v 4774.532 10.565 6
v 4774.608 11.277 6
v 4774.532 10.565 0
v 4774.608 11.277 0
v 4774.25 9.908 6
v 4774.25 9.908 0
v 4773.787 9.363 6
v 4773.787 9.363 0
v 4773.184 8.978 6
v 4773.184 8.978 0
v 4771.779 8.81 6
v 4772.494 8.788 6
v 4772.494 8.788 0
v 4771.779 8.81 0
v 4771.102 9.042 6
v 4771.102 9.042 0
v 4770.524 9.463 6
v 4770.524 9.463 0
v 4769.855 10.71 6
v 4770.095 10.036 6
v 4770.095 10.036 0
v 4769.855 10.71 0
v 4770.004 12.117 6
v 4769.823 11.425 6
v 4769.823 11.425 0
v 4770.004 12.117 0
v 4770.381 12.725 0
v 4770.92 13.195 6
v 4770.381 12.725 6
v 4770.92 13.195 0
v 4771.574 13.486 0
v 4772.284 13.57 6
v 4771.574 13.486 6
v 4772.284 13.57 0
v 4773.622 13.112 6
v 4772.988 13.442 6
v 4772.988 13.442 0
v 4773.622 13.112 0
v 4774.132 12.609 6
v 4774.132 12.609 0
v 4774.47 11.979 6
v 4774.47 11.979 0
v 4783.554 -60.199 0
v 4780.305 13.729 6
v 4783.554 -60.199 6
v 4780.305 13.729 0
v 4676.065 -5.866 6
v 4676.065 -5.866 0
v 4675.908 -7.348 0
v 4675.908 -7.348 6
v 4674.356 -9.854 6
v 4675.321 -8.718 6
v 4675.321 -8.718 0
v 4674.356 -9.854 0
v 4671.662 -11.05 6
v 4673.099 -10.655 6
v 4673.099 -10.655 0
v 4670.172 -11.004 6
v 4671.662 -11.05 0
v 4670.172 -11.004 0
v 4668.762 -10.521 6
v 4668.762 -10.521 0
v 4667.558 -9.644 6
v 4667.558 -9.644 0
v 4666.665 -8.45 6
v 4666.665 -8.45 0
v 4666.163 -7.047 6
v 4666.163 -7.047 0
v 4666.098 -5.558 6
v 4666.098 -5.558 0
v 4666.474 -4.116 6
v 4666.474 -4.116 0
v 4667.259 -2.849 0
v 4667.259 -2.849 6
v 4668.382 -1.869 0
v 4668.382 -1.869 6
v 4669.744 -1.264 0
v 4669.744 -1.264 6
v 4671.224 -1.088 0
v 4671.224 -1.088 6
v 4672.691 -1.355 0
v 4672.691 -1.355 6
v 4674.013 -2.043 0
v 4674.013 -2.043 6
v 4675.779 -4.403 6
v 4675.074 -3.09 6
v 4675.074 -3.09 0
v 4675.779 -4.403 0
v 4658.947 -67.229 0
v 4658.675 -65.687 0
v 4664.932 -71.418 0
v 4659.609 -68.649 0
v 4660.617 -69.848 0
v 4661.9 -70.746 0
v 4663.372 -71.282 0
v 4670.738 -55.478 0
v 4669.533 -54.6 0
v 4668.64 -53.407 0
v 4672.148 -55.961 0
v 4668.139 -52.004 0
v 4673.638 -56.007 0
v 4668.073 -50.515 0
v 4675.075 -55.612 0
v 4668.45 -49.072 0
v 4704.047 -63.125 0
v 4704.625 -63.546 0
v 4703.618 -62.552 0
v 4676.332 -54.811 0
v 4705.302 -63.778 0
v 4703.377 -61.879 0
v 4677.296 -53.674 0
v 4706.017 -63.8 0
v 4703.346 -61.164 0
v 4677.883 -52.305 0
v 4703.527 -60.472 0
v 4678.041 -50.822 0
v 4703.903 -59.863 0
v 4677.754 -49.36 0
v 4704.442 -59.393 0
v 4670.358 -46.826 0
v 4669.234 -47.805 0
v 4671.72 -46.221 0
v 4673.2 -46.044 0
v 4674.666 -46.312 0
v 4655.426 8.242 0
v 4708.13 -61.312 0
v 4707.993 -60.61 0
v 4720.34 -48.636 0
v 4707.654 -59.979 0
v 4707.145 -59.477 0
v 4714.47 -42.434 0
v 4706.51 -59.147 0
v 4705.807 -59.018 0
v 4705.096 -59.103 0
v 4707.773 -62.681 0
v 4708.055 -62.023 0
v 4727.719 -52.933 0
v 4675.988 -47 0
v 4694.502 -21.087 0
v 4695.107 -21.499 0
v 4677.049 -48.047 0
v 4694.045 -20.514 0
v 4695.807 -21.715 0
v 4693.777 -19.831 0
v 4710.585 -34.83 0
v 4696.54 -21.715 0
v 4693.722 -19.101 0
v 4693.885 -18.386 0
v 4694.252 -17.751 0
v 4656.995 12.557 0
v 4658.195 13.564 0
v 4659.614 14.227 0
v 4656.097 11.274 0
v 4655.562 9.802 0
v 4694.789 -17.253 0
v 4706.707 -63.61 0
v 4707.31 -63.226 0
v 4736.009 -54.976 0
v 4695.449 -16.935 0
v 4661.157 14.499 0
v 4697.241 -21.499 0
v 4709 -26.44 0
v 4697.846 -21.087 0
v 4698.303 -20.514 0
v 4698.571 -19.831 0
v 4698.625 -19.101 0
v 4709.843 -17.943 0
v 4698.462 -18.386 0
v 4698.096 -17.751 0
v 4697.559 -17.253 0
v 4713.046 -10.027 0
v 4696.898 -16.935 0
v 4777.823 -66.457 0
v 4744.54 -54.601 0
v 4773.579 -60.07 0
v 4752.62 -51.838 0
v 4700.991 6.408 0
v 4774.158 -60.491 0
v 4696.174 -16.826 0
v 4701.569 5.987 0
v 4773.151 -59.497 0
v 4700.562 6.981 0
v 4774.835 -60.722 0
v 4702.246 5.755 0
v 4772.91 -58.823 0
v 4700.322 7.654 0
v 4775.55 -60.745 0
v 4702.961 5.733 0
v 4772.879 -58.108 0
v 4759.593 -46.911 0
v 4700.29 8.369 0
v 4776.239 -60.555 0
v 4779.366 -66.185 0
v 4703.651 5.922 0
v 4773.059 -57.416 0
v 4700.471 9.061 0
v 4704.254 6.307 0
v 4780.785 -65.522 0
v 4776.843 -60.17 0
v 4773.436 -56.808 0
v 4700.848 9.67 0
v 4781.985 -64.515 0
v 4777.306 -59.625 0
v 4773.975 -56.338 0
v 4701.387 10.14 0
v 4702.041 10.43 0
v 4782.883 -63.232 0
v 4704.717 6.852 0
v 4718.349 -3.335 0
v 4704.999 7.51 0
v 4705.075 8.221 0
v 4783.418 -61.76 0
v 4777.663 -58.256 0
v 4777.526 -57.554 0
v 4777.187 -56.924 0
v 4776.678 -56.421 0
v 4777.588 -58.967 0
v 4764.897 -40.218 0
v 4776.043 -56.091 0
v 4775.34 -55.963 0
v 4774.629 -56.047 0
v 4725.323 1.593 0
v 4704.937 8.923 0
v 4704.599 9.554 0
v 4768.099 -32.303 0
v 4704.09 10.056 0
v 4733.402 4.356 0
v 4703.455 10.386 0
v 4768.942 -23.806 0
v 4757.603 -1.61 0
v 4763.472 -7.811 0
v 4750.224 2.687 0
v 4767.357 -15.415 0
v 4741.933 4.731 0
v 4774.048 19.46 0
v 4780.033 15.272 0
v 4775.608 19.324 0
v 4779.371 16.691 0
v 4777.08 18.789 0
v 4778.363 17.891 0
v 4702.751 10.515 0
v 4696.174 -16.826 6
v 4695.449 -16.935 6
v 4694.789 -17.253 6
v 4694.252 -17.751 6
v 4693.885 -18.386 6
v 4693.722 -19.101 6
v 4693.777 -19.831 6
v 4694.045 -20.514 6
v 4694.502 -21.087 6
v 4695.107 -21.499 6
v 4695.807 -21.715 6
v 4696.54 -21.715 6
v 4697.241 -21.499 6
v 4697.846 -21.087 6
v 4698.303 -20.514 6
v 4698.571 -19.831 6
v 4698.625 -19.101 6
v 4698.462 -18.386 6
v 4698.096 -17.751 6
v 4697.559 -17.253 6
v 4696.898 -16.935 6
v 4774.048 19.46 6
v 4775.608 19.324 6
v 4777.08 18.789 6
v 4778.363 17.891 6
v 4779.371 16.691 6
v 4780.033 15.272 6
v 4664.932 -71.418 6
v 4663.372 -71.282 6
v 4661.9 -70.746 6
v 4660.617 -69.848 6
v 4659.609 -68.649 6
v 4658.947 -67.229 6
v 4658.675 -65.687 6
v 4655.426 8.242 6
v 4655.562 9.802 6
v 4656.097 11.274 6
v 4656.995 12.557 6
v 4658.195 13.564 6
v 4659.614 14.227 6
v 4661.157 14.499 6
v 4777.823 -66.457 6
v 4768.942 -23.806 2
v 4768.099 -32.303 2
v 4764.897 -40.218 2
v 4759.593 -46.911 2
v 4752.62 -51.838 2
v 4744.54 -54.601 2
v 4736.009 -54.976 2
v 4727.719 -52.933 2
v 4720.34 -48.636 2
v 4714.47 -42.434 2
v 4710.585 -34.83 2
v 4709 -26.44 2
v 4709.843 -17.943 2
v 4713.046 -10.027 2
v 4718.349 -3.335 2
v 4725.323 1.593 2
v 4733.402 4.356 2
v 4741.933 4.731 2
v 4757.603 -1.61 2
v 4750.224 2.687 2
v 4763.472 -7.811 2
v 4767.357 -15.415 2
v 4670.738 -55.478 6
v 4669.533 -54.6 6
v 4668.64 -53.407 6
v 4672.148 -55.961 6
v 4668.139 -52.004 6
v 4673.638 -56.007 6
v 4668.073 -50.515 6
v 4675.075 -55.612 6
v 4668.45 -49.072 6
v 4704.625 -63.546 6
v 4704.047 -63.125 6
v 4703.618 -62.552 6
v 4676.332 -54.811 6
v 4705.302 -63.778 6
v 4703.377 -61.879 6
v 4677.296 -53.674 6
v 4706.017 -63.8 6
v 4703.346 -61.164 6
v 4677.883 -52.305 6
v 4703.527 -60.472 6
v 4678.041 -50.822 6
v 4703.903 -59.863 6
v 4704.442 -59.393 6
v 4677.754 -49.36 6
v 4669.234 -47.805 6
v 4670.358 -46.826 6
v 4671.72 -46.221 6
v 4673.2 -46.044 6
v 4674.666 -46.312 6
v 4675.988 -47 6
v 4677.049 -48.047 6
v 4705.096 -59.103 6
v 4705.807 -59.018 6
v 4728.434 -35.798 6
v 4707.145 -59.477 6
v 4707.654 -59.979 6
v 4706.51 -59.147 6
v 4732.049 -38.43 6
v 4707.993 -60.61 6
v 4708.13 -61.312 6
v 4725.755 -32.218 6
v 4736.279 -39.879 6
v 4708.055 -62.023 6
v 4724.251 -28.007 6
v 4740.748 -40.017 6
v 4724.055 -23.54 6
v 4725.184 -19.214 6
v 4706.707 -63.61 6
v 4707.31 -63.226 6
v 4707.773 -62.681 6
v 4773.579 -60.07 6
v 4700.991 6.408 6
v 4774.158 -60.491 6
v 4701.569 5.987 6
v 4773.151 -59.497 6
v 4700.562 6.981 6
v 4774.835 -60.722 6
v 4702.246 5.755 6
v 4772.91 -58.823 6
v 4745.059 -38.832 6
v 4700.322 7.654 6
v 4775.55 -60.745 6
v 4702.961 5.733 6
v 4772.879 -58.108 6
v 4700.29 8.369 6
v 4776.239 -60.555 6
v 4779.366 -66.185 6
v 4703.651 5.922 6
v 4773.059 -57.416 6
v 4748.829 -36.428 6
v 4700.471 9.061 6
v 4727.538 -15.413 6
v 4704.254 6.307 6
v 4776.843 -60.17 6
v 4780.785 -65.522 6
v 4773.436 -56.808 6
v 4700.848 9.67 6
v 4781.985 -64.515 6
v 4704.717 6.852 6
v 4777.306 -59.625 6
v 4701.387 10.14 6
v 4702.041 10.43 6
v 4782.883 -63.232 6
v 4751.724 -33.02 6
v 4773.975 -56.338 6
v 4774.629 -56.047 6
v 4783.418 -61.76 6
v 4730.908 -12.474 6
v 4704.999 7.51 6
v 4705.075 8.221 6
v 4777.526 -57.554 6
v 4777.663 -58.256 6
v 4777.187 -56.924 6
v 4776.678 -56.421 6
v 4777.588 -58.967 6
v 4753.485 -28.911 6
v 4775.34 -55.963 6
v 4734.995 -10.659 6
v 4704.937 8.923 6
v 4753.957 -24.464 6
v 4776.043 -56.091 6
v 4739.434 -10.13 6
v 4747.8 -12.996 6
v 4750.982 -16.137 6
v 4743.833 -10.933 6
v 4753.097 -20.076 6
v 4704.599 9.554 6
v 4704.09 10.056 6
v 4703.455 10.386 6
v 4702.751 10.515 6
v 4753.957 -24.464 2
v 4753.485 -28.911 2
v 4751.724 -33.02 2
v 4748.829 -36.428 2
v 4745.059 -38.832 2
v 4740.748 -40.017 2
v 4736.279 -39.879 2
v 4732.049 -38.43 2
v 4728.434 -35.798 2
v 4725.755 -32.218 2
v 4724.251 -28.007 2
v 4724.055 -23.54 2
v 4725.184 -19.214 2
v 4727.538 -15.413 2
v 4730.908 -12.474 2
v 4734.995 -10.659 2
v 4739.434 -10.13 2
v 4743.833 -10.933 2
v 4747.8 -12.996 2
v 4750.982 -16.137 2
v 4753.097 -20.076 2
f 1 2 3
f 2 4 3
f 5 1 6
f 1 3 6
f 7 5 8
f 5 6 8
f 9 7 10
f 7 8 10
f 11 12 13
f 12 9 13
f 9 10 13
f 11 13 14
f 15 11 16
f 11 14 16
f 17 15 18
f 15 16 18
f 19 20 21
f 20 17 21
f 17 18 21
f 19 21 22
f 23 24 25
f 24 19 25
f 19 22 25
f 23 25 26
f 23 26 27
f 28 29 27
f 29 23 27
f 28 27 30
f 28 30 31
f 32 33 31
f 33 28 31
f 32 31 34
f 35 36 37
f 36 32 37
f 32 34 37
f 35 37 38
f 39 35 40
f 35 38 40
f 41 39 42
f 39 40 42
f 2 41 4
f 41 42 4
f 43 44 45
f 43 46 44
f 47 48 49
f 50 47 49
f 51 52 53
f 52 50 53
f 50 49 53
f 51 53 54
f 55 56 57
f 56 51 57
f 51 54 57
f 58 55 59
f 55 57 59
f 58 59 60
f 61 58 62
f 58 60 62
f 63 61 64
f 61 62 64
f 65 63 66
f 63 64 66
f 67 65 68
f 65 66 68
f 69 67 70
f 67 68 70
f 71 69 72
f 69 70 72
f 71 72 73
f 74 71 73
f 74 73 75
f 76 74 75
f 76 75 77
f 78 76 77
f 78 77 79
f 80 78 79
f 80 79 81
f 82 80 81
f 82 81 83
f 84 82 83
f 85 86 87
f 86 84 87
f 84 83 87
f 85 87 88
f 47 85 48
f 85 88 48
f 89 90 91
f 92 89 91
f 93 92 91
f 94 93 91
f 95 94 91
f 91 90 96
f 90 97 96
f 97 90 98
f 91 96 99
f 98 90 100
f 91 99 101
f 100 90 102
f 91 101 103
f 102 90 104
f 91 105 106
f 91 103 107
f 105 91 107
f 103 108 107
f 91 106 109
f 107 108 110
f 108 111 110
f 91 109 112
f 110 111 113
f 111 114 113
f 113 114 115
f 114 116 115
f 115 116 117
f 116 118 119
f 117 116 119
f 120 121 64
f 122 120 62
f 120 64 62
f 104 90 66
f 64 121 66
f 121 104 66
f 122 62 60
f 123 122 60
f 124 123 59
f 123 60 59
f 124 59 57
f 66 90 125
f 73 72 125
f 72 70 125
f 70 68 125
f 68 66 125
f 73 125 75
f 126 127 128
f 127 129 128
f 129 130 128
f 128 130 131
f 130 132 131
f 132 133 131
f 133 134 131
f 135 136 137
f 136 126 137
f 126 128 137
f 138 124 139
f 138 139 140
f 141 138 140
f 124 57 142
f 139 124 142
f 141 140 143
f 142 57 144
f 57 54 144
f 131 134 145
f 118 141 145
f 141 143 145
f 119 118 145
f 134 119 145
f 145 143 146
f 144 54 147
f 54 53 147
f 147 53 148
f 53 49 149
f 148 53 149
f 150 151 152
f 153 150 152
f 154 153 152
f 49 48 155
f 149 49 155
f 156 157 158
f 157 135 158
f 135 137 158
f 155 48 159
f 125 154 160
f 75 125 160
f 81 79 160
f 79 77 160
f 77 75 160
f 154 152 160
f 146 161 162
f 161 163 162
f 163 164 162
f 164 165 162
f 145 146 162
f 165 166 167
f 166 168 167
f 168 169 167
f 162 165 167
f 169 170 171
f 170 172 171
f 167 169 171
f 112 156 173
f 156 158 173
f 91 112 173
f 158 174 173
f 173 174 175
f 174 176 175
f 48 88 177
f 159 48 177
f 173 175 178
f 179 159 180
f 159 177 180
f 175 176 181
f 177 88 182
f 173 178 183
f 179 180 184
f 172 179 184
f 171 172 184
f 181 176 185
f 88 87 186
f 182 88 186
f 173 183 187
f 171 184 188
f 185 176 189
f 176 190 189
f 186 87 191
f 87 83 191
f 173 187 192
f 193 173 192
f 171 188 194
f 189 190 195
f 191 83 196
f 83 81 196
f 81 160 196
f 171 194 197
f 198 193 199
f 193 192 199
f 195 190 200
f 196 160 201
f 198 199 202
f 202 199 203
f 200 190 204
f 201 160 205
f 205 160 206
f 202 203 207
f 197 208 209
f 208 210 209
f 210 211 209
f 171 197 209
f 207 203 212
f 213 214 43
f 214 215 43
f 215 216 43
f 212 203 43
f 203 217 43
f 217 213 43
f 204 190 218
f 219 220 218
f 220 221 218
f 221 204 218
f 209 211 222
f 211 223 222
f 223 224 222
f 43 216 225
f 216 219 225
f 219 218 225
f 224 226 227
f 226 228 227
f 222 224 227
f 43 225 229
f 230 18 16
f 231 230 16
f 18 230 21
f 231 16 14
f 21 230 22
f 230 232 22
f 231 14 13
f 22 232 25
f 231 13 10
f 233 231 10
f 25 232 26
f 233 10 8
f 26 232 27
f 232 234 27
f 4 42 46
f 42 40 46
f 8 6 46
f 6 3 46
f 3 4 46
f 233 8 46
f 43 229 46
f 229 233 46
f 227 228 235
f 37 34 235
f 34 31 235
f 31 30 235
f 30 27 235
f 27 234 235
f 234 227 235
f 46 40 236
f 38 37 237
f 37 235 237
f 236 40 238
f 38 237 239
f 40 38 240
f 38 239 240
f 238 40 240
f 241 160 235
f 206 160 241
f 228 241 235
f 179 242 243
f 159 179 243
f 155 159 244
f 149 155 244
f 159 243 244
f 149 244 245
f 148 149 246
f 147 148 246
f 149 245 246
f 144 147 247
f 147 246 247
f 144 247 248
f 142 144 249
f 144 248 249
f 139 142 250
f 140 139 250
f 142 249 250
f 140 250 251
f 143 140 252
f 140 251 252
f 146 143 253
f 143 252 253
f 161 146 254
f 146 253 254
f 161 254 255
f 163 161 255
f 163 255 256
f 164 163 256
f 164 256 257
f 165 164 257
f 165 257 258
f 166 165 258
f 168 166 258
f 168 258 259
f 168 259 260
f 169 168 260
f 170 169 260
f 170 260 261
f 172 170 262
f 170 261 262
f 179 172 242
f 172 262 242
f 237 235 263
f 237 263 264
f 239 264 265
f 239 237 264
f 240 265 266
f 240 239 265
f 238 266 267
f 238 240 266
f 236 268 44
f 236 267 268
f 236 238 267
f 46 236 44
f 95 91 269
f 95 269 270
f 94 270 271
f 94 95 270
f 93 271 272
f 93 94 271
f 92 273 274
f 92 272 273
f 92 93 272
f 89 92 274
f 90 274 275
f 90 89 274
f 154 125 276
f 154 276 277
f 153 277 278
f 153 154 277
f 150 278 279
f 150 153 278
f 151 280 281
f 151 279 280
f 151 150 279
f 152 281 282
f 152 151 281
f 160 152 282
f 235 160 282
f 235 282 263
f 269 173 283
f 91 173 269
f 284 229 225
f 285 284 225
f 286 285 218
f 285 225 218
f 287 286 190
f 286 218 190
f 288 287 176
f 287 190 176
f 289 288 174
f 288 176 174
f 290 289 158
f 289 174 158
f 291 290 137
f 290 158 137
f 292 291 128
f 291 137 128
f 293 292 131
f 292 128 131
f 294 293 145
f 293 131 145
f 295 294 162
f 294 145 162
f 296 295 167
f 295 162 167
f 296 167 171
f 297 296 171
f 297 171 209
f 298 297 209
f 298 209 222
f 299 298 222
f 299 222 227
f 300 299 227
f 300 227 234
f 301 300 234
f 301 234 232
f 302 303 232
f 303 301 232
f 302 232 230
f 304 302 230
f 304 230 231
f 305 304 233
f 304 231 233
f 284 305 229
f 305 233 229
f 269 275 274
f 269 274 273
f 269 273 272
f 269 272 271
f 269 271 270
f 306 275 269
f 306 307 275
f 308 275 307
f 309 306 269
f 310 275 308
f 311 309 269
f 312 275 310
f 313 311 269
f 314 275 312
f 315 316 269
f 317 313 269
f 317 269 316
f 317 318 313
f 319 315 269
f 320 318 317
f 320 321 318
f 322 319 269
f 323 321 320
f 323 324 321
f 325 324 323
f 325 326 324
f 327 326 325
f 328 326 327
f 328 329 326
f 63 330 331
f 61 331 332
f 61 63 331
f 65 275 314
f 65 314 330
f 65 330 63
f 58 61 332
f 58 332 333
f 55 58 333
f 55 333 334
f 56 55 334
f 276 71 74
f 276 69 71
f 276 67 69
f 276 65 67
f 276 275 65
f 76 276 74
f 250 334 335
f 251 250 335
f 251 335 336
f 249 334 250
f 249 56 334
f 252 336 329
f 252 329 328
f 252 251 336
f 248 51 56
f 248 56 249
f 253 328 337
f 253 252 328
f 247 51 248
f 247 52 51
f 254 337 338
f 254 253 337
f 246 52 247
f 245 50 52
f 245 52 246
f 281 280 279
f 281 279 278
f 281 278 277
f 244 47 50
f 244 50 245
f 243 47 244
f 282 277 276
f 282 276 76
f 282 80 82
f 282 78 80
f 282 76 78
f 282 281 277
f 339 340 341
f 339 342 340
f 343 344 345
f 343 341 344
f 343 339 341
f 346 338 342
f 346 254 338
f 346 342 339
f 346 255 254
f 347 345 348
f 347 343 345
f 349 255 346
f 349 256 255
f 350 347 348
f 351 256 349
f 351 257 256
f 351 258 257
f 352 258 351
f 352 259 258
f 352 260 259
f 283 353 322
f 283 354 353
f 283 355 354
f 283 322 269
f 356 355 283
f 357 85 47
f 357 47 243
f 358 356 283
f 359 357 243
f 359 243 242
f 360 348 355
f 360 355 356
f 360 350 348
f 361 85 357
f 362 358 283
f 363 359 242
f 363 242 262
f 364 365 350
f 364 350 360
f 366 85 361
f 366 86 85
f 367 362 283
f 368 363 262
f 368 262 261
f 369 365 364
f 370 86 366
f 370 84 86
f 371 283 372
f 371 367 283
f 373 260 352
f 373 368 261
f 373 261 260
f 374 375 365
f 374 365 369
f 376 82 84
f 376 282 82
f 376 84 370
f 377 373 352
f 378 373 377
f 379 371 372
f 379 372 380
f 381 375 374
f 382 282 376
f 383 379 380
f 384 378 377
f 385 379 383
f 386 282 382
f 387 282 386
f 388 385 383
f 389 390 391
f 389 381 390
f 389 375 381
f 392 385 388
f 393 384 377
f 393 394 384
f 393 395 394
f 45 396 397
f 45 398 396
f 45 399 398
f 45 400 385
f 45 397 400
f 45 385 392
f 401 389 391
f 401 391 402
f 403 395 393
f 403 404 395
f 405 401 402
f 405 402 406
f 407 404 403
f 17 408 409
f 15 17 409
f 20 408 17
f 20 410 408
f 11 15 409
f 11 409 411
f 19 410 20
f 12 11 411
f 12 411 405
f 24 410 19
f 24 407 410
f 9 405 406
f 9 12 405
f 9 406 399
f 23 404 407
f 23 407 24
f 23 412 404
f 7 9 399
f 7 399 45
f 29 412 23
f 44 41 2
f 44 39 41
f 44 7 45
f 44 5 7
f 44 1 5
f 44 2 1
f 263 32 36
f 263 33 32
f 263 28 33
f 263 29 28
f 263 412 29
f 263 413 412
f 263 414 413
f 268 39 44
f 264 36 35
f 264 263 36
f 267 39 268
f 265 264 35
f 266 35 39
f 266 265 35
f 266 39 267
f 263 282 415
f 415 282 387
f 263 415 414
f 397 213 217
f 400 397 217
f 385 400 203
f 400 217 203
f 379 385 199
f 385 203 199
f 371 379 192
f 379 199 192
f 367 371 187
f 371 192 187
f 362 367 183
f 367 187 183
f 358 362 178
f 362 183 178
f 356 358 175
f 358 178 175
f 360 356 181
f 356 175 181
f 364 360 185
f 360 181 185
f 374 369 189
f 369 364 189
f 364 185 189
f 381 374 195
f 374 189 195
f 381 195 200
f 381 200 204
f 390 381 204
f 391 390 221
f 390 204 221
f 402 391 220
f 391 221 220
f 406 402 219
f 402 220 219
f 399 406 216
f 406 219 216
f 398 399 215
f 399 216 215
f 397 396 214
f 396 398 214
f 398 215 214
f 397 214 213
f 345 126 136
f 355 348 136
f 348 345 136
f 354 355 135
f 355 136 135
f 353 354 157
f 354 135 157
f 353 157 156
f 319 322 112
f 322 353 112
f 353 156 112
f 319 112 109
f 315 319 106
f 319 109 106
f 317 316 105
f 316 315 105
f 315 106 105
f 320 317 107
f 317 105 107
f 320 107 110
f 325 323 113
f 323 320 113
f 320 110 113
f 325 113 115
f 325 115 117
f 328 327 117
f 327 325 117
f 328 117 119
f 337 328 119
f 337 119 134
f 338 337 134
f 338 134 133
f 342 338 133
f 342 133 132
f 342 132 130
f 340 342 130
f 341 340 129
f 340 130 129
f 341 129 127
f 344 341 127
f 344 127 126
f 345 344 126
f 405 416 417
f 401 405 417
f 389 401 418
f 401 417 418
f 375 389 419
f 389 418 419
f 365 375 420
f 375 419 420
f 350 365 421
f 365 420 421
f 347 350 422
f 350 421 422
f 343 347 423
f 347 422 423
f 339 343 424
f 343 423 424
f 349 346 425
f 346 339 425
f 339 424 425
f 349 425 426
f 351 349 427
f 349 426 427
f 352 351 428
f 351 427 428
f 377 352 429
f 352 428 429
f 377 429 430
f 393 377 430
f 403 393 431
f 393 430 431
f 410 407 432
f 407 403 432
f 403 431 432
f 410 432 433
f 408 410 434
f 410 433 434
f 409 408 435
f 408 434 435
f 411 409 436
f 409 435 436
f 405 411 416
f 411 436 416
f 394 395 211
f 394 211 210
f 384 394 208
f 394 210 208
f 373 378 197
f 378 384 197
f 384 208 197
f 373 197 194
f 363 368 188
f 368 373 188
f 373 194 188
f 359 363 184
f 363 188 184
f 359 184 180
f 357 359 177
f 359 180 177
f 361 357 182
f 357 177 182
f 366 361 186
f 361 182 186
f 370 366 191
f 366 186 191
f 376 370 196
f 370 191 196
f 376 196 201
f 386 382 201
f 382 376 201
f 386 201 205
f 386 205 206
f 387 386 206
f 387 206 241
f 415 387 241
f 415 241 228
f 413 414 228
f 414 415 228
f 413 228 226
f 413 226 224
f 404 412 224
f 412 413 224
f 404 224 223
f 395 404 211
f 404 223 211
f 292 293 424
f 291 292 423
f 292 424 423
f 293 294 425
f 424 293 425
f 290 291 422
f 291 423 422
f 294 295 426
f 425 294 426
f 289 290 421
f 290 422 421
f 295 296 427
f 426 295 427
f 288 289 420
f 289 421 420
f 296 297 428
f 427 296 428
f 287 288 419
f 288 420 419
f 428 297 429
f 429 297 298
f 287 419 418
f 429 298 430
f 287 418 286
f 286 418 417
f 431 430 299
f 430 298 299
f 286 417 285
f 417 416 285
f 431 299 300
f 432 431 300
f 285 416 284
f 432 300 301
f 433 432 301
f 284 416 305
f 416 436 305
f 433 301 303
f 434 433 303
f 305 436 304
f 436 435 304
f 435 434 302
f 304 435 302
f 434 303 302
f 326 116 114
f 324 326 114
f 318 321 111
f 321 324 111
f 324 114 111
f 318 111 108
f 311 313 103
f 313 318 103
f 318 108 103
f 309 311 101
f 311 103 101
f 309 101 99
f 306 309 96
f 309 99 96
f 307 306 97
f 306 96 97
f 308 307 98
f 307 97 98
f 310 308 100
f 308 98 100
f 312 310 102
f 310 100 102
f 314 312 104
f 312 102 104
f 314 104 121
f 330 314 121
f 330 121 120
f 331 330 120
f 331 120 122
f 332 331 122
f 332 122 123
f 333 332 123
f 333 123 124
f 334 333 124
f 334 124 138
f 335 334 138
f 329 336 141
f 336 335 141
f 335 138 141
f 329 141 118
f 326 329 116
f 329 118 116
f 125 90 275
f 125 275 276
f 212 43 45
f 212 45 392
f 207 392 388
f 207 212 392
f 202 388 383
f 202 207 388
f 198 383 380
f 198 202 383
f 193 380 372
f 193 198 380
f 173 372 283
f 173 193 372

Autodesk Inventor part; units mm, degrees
ref_plane "YZ Plane" through (0, 0, 0) normal (1, 0, 0) x (0, 1, 0)
ref_plane "XZ Plane" through (0, 0, 0) normal (0, 1, 0) x (-1, 0, 0)
ref_plane "XY Plane" through (0, 0, 0) normal (0, 0, 1) x (1, 0, 0)
ref_plane "Płaszczyzna konstrukcyjna1" through (4586.1519, -9.817, 0) normal (0, 0, 1) x (0.999, 0.0439, 0)
sketch "Szkic1" plane through (4586.1519, -9.817, 0) normal (0, 0, 1) x (0.999, 0.0439, 0)
  circle A0 centre (85, 0) radius 5
  circle A1 centre (85, -45) radius 5
  line L0 (76, 21) -> (189, 21)
  line L1 (195, 15) -> (195, -59)
  line L2 (189, -65) -> (76, -65)
  line L3 (70, -59) -> (70, 15)
  arc A2 (70, -59) -> (76, -65) centre (76, -59) ccw
  arc A3 (76, 21) -> (70, 15) centre (76, 15) ccw
  arc A4 (189, -65) -> (195, -59) centre (189, -59) ccw
  arc A5 (195, 15) -> (189, 21) centre (189, 15) ccw
  circle A6 centre (152, -22) radius 30
  circle A7 centre (152, -22) radius 15
  line L4 (117.2, 12.8) -> (186.8, -56.8) construction
  line L5 (186.8, 12.8) -> (117.2, -56.8) construction
  circle A8 centre (117.2, 12.8) radius 2.4
  circle A9 centre (117.2, -56.8) radius 2.4
  circle A10 centre (186.8, -56.8) radius 2.4
  circle A11 centre (186.8, 12.8) radius 2.4
  point P0 (-4581.2965, 211.2059)
  point P1 (195, -65)
  point P2 (195, 21)
  point P3 (70, -65)
  dimension "d0" = 10
  dimension "d1" = 10
  dimension "d2" = 125
  dimension "d3" = 86
  dimension "d4" = 6
  dimension "d7" = 45
  dimension "d8" = 60
  dimension "d9" = 30
  dimension "d10" = 69.6
  dimension "d11" = 69.6
  dimension "d12" = 4.8
  dimension "d13" = 4.8
  dimension "d14" = 4.8
  dimension "d15" = 4.8
extrude "Wyciągnięcie proste1" add sketch "Szkic1" along normal blind 6 contours L0 A5 L1 A4 L2 A2 L3 A3 | A6
extrude "Wyciągnięcie proste2" cut sketch "Szkic1" along normal blind 2 contours A6
thread "Gwint1" size "M6x1" class "6H" standard "ANSI Metric M Profile" full length
thread "Gwint2" size "M6x1" class "6H" standard "ANSI Metric M Profile" full length
thread "Gwint3" size "M6x1" class "6H" standard "ANSI Metric M Profile" full length
thread "Gwint4" size "M6x1" class "6H" standard "ANSI Metric M Profile" full length
sketch "Szkic3" plane through (4586.1519, -9.817, 0) normal (0, 0, -1) x (-0.999, -0.0439, 0)
  point P0 (-109.5, -14.2897)
hole "Otwór2" at (4696.1738, -19.2843, 0) direction (0, 0, 1) diameter 4.917 end through all thread size "M6x1" class "6H" standard "ISO Metric profile"
properties part number "mocowanie silnika" material "Tytan"
